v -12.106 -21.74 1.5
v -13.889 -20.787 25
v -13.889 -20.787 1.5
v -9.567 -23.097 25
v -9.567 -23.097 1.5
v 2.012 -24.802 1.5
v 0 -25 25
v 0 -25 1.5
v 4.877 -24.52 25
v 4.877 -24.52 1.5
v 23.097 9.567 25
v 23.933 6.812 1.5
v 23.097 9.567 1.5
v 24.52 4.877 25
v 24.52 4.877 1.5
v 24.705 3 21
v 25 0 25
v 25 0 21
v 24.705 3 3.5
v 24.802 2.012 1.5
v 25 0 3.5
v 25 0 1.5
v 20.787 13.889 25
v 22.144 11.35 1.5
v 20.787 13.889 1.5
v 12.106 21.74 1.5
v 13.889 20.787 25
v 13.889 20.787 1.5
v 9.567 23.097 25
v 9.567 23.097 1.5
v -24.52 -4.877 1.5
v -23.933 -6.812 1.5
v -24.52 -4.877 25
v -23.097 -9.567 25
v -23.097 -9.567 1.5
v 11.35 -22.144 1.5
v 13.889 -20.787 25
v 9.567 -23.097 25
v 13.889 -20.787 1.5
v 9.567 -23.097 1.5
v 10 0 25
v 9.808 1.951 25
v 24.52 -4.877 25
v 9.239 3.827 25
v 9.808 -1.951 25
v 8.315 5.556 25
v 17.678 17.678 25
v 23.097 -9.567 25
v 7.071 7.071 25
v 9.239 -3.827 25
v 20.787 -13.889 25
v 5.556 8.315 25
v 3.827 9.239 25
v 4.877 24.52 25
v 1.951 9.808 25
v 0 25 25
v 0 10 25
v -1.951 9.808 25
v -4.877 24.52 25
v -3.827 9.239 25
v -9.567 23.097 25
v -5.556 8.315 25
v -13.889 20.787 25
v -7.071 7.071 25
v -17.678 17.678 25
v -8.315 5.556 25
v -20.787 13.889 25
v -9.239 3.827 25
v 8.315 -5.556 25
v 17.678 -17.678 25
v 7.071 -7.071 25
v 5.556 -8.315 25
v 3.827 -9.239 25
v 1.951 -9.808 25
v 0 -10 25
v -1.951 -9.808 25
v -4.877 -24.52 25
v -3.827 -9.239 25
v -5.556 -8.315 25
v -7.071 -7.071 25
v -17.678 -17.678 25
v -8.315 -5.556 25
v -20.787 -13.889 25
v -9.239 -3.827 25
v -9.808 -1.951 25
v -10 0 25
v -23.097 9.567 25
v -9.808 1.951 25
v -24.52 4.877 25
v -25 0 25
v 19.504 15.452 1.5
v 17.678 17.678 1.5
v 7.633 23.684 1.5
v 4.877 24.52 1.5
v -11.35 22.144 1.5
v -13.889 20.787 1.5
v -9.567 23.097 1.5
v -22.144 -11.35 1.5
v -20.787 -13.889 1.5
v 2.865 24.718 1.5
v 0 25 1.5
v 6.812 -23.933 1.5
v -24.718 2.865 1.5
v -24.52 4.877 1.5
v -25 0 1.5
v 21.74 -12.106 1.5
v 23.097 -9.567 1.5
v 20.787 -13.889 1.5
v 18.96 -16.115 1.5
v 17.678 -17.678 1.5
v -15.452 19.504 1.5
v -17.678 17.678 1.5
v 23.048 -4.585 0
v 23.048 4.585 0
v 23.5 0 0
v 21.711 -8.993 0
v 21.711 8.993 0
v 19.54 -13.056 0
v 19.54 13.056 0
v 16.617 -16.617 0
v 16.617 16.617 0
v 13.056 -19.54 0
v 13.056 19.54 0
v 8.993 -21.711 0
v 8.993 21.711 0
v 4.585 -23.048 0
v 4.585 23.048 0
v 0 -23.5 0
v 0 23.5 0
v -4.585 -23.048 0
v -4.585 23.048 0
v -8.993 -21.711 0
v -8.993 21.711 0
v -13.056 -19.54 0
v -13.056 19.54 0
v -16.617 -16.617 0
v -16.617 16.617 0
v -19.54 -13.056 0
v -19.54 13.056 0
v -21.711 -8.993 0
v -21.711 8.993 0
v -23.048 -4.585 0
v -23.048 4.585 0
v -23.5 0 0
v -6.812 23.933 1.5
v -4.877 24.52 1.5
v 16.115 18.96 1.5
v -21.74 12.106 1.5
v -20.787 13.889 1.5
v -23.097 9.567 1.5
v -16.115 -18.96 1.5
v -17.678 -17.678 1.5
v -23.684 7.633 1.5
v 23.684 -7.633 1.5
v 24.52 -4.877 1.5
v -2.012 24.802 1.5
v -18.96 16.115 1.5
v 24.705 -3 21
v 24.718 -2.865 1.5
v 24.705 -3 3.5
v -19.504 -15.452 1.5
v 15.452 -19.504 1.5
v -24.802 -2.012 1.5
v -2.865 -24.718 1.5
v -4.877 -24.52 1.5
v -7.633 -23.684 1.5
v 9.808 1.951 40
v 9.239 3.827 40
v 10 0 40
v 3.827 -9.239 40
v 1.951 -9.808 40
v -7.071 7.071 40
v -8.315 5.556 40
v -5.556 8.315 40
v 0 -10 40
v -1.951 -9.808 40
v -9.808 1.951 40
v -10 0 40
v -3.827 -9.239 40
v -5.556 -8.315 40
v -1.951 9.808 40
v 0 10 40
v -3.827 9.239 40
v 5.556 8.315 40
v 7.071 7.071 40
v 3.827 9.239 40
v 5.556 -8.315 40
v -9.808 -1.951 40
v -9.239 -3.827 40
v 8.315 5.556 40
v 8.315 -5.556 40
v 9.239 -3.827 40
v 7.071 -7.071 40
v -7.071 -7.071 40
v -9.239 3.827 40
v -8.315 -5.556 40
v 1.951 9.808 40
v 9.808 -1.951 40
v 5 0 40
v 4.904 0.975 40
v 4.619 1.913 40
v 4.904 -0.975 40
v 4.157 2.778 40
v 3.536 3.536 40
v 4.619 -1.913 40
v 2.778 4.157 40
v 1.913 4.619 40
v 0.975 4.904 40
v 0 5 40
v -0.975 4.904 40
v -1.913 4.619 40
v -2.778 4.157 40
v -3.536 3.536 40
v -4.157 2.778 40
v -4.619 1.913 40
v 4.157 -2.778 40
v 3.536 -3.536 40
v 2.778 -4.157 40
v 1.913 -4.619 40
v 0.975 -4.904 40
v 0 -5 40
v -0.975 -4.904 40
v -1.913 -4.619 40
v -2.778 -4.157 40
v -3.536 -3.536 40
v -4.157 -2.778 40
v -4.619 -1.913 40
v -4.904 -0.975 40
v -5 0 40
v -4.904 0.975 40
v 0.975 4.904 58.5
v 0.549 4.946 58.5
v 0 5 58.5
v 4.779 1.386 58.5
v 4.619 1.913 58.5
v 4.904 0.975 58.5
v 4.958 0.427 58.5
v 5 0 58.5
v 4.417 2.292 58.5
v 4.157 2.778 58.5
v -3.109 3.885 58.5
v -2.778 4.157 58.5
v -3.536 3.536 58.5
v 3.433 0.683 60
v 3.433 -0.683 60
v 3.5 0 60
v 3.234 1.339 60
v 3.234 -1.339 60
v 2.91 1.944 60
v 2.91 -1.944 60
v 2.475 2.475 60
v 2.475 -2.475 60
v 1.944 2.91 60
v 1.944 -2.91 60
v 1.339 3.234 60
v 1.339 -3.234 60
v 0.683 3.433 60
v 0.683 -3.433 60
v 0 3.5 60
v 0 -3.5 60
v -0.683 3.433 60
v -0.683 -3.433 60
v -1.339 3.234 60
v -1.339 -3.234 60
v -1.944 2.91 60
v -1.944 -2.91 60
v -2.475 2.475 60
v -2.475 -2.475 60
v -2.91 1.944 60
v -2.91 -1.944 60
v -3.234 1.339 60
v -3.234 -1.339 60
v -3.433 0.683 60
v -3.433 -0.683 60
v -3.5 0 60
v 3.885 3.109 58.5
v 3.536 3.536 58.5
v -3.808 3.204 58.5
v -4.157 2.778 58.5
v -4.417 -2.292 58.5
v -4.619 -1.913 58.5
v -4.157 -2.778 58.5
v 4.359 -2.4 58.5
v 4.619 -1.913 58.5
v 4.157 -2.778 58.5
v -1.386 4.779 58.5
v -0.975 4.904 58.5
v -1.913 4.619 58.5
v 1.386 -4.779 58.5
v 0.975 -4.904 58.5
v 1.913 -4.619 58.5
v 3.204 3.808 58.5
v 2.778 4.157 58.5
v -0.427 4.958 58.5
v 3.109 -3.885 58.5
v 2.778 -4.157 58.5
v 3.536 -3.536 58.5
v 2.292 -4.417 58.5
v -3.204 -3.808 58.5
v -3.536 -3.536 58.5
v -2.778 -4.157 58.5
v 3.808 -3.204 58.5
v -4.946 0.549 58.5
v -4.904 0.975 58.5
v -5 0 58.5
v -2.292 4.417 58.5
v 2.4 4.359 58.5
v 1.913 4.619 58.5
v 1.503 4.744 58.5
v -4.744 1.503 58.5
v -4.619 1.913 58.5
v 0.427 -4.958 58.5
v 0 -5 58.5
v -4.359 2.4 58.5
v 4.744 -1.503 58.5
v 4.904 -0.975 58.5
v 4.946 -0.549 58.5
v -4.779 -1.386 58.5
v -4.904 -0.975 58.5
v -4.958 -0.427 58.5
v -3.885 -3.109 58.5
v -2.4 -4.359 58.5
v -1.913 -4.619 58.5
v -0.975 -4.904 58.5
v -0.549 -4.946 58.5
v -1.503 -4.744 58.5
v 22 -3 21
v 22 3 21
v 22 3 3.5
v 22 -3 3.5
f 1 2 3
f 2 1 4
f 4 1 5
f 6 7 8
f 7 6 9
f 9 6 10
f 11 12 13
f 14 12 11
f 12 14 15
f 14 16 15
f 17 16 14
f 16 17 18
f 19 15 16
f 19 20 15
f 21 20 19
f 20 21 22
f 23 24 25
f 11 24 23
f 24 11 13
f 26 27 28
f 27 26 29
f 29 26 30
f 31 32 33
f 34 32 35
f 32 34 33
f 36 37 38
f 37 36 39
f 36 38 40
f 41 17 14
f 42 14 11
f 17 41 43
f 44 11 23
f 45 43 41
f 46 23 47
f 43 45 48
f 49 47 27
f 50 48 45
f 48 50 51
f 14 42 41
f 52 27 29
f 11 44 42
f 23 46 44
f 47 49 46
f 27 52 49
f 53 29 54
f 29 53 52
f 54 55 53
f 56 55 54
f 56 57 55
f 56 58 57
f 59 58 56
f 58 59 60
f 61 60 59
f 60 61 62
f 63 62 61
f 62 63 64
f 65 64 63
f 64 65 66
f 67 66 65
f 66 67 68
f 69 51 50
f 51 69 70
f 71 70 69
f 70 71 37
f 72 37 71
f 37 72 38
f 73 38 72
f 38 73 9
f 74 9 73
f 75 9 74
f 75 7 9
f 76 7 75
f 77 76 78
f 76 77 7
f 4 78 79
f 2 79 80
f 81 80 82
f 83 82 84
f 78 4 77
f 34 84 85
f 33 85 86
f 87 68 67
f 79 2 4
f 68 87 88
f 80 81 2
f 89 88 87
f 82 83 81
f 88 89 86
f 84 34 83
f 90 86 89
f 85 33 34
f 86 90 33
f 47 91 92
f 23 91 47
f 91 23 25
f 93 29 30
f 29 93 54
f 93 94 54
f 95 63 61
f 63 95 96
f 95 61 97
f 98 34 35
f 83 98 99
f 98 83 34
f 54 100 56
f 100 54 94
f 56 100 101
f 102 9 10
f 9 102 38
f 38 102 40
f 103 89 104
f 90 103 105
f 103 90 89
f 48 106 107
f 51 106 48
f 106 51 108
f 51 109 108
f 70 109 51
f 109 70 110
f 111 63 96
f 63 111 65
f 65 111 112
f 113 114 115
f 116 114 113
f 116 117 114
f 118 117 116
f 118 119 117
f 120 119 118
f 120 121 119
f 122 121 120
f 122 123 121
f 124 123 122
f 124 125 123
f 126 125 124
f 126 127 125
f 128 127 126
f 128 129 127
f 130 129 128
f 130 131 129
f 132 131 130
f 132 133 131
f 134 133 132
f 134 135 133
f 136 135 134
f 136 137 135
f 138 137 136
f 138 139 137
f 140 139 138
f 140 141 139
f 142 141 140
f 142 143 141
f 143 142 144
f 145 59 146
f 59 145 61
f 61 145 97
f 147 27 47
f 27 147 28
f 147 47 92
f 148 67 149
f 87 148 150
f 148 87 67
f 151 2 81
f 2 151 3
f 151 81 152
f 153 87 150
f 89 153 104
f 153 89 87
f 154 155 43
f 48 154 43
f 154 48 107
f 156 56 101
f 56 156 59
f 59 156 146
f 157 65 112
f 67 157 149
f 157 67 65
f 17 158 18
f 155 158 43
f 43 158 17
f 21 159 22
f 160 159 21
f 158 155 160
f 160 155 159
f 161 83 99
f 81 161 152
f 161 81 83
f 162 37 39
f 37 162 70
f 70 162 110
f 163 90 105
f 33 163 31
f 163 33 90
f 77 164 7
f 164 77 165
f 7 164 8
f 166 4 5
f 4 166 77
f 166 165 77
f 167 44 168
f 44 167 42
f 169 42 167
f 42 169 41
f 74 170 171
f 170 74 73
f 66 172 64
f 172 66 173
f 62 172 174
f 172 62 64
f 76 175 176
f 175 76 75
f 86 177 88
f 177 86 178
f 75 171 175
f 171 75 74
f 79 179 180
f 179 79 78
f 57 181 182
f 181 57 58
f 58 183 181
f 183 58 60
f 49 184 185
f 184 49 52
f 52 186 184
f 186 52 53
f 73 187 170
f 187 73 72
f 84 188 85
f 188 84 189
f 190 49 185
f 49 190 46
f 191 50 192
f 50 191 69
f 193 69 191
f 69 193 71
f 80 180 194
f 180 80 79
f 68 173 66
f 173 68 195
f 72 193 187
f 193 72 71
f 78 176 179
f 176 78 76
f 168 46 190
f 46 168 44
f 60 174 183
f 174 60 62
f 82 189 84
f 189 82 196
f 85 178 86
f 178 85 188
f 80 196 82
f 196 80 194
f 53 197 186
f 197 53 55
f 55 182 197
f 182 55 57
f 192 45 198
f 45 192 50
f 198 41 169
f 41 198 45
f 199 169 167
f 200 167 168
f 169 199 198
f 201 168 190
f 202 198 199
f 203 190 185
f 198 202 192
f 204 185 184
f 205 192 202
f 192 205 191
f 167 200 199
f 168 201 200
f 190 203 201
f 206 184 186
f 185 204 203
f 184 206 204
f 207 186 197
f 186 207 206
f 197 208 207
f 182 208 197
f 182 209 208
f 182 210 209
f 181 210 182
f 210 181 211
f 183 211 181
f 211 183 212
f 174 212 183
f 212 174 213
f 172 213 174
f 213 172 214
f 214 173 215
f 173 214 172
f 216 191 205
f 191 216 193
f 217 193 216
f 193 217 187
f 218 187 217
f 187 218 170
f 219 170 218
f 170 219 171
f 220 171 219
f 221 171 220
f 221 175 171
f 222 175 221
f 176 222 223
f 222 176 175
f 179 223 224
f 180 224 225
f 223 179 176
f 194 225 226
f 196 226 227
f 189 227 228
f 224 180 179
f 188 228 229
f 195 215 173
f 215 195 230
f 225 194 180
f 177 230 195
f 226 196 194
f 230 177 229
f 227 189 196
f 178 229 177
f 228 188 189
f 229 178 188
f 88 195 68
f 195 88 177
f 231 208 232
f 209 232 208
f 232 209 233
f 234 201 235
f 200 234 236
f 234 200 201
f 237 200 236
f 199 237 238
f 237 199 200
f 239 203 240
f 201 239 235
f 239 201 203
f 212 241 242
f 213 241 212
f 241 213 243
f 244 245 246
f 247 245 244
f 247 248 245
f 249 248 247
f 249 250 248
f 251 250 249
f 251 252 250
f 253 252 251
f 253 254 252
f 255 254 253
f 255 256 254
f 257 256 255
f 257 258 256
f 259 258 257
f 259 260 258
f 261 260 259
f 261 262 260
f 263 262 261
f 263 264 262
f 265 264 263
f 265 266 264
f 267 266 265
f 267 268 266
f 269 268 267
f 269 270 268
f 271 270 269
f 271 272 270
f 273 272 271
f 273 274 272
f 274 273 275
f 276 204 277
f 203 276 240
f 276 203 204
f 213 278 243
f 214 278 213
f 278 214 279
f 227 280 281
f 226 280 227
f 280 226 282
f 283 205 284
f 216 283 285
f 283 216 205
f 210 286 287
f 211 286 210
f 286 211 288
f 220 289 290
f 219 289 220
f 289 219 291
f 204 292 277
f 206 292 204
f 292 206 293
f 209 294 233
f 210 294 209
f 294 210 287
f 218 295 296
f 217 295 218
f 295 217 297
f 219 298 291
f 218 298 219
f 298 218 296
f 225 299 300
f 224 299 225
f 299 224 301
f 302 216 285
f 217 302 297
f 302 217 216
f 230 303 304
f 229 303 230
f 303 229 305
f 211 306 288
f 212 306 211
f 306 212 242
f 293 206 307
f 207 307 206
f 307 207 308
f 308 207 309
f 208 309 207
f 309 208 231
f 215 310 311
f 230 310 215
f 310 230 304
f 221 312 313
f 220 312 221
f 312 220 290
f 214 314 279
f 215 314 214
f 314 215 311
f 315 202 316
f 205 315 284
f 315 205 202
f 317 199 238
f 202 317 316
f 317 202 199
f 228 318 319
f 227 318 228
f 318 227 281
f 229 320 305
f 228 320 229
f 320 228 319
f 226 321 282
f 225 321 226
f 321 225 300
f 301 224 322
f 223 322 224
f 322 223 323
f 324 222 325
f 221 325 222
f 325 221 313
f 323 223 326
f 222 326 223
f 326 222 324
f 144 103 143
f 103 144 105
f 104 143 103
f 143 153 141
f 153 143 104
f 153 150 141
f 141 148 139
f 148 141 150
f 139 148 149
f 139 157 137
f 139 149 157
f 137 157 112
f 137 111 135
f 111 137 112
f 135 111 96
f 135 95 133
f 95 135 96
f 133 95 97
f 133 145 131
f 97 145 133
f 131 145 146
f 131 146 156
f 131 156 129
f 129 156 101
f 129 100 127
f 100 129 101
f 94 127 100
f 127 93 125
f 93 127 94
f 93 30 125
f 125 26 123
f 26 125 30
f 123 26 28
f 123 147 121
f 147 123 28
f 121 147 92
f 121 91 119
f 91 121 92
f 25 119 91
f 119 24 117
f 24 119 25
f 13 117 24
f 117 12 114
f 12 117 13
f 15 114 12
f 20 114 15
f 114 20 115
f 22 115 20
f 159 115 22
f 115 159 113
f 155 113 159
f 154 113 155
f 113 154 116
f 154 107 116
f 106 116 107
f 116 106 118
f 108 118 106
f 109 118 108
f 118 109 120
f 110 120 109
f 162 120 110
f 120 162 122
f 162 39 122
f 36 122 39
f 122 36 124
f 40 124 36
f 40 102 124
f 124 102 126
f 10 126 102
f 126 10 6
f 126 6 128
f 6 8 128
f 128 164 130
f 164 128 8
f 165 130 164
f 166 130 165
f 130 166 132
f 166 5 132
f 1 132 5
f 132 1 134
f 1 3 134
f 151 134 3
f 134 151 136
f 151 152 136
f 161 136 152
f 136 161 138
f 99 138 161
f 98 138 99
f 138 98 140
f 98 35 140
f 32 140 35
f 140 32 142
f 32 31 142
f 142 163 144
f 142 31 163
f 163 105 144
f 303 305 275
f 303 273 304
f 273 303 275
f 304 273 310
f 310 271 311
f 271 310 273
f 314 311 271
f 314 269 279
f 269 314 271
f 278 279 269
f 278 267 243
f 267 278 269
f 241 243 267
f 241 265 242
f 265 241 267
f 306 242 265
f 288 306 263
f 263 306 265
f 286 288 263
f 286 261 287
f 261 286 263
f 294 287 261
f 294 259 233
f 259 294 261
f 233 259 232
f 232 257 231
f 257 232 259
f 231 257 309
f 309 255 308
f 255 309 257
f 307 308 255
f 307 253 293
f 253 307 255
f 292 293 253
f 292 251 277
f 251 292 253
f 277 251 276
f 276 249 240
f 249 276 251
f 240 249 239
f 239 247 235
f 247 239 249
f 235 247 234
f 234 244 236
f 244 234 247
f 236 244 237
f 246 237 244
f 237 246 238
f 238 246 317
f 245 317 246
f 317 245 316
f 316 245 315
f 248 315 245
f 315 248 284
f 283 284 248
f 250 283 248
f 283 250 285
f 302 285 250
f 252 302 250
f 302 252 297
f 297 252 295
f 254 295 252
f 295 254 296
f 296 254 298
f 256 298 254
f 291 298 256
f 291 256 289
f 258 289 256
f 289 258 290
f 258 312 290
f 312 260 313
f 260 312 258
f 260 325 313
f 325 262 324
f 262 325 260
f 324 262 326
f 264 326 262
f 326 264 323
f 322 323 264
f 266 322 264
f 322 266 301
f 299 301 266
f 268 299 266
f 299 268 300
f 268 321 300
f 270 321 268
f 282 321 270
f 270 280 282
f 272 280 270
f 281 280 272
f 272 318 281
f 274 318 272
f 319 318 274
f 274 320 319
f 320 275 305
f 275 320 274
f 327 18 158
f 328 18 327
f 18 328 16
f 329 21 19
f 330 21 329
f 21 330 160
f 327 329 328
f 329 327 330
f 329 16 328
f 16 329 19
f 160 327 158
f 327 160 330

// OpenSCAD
$fn = 32;

// ----------------------------------------------------------------------
// Stepped shaft: diameters 50, 20, 10 mm, 60 mm long
// ----------------------------------------------------------------------

// --- parameters (mm) ---
d1 = 50;                  // step 1 diameter
len1 = 25;                // step 1 length
d2 = 20;                  // step 2 diameter
len2 = 15;                // step 2 length
d3 = 10;                  // step 3 diameter
len3 = 20;                // step 3 length
total = 60;               // overall length
chamfer = 1.5;            // end chamfer
key_w = 6;                // keyway width
key_d = 3;                // keyway depth
key_len = 17.5;           // keyway length
key_z = 3.5;              // keyway start along the shaft

difference() {
  /* turned body: stacked cylinders, every step sunk into the bigger one */
  union() {
    cylinder(h = len1, d = d1);
    translate([0, 0, 24.6]) cylinder(h = 15.4, d = d2);
    translate([0, 0, 39.6]) cylinder(h = 20.4, d = d3);
  }
  /* bottom chamfer ring cut */
  rotate_extrude() translate([23.5, -2.5]) polygon([[0, 0], [4, 0], [4, 6.5], [0, 2.5]]);
  /* top chamfer ring cut */
  rotate_extrude() translate([3.5, 60]) polygon([[0, 0], [4, -4], [4, 2.5], [0, 2.5]]);
  /* keyway milled along the first step */
  translate([d1 / 2 - key_d, -key_w / 2, key_z]) cube([key_d + 2.5, key_w, key_len]);
}
